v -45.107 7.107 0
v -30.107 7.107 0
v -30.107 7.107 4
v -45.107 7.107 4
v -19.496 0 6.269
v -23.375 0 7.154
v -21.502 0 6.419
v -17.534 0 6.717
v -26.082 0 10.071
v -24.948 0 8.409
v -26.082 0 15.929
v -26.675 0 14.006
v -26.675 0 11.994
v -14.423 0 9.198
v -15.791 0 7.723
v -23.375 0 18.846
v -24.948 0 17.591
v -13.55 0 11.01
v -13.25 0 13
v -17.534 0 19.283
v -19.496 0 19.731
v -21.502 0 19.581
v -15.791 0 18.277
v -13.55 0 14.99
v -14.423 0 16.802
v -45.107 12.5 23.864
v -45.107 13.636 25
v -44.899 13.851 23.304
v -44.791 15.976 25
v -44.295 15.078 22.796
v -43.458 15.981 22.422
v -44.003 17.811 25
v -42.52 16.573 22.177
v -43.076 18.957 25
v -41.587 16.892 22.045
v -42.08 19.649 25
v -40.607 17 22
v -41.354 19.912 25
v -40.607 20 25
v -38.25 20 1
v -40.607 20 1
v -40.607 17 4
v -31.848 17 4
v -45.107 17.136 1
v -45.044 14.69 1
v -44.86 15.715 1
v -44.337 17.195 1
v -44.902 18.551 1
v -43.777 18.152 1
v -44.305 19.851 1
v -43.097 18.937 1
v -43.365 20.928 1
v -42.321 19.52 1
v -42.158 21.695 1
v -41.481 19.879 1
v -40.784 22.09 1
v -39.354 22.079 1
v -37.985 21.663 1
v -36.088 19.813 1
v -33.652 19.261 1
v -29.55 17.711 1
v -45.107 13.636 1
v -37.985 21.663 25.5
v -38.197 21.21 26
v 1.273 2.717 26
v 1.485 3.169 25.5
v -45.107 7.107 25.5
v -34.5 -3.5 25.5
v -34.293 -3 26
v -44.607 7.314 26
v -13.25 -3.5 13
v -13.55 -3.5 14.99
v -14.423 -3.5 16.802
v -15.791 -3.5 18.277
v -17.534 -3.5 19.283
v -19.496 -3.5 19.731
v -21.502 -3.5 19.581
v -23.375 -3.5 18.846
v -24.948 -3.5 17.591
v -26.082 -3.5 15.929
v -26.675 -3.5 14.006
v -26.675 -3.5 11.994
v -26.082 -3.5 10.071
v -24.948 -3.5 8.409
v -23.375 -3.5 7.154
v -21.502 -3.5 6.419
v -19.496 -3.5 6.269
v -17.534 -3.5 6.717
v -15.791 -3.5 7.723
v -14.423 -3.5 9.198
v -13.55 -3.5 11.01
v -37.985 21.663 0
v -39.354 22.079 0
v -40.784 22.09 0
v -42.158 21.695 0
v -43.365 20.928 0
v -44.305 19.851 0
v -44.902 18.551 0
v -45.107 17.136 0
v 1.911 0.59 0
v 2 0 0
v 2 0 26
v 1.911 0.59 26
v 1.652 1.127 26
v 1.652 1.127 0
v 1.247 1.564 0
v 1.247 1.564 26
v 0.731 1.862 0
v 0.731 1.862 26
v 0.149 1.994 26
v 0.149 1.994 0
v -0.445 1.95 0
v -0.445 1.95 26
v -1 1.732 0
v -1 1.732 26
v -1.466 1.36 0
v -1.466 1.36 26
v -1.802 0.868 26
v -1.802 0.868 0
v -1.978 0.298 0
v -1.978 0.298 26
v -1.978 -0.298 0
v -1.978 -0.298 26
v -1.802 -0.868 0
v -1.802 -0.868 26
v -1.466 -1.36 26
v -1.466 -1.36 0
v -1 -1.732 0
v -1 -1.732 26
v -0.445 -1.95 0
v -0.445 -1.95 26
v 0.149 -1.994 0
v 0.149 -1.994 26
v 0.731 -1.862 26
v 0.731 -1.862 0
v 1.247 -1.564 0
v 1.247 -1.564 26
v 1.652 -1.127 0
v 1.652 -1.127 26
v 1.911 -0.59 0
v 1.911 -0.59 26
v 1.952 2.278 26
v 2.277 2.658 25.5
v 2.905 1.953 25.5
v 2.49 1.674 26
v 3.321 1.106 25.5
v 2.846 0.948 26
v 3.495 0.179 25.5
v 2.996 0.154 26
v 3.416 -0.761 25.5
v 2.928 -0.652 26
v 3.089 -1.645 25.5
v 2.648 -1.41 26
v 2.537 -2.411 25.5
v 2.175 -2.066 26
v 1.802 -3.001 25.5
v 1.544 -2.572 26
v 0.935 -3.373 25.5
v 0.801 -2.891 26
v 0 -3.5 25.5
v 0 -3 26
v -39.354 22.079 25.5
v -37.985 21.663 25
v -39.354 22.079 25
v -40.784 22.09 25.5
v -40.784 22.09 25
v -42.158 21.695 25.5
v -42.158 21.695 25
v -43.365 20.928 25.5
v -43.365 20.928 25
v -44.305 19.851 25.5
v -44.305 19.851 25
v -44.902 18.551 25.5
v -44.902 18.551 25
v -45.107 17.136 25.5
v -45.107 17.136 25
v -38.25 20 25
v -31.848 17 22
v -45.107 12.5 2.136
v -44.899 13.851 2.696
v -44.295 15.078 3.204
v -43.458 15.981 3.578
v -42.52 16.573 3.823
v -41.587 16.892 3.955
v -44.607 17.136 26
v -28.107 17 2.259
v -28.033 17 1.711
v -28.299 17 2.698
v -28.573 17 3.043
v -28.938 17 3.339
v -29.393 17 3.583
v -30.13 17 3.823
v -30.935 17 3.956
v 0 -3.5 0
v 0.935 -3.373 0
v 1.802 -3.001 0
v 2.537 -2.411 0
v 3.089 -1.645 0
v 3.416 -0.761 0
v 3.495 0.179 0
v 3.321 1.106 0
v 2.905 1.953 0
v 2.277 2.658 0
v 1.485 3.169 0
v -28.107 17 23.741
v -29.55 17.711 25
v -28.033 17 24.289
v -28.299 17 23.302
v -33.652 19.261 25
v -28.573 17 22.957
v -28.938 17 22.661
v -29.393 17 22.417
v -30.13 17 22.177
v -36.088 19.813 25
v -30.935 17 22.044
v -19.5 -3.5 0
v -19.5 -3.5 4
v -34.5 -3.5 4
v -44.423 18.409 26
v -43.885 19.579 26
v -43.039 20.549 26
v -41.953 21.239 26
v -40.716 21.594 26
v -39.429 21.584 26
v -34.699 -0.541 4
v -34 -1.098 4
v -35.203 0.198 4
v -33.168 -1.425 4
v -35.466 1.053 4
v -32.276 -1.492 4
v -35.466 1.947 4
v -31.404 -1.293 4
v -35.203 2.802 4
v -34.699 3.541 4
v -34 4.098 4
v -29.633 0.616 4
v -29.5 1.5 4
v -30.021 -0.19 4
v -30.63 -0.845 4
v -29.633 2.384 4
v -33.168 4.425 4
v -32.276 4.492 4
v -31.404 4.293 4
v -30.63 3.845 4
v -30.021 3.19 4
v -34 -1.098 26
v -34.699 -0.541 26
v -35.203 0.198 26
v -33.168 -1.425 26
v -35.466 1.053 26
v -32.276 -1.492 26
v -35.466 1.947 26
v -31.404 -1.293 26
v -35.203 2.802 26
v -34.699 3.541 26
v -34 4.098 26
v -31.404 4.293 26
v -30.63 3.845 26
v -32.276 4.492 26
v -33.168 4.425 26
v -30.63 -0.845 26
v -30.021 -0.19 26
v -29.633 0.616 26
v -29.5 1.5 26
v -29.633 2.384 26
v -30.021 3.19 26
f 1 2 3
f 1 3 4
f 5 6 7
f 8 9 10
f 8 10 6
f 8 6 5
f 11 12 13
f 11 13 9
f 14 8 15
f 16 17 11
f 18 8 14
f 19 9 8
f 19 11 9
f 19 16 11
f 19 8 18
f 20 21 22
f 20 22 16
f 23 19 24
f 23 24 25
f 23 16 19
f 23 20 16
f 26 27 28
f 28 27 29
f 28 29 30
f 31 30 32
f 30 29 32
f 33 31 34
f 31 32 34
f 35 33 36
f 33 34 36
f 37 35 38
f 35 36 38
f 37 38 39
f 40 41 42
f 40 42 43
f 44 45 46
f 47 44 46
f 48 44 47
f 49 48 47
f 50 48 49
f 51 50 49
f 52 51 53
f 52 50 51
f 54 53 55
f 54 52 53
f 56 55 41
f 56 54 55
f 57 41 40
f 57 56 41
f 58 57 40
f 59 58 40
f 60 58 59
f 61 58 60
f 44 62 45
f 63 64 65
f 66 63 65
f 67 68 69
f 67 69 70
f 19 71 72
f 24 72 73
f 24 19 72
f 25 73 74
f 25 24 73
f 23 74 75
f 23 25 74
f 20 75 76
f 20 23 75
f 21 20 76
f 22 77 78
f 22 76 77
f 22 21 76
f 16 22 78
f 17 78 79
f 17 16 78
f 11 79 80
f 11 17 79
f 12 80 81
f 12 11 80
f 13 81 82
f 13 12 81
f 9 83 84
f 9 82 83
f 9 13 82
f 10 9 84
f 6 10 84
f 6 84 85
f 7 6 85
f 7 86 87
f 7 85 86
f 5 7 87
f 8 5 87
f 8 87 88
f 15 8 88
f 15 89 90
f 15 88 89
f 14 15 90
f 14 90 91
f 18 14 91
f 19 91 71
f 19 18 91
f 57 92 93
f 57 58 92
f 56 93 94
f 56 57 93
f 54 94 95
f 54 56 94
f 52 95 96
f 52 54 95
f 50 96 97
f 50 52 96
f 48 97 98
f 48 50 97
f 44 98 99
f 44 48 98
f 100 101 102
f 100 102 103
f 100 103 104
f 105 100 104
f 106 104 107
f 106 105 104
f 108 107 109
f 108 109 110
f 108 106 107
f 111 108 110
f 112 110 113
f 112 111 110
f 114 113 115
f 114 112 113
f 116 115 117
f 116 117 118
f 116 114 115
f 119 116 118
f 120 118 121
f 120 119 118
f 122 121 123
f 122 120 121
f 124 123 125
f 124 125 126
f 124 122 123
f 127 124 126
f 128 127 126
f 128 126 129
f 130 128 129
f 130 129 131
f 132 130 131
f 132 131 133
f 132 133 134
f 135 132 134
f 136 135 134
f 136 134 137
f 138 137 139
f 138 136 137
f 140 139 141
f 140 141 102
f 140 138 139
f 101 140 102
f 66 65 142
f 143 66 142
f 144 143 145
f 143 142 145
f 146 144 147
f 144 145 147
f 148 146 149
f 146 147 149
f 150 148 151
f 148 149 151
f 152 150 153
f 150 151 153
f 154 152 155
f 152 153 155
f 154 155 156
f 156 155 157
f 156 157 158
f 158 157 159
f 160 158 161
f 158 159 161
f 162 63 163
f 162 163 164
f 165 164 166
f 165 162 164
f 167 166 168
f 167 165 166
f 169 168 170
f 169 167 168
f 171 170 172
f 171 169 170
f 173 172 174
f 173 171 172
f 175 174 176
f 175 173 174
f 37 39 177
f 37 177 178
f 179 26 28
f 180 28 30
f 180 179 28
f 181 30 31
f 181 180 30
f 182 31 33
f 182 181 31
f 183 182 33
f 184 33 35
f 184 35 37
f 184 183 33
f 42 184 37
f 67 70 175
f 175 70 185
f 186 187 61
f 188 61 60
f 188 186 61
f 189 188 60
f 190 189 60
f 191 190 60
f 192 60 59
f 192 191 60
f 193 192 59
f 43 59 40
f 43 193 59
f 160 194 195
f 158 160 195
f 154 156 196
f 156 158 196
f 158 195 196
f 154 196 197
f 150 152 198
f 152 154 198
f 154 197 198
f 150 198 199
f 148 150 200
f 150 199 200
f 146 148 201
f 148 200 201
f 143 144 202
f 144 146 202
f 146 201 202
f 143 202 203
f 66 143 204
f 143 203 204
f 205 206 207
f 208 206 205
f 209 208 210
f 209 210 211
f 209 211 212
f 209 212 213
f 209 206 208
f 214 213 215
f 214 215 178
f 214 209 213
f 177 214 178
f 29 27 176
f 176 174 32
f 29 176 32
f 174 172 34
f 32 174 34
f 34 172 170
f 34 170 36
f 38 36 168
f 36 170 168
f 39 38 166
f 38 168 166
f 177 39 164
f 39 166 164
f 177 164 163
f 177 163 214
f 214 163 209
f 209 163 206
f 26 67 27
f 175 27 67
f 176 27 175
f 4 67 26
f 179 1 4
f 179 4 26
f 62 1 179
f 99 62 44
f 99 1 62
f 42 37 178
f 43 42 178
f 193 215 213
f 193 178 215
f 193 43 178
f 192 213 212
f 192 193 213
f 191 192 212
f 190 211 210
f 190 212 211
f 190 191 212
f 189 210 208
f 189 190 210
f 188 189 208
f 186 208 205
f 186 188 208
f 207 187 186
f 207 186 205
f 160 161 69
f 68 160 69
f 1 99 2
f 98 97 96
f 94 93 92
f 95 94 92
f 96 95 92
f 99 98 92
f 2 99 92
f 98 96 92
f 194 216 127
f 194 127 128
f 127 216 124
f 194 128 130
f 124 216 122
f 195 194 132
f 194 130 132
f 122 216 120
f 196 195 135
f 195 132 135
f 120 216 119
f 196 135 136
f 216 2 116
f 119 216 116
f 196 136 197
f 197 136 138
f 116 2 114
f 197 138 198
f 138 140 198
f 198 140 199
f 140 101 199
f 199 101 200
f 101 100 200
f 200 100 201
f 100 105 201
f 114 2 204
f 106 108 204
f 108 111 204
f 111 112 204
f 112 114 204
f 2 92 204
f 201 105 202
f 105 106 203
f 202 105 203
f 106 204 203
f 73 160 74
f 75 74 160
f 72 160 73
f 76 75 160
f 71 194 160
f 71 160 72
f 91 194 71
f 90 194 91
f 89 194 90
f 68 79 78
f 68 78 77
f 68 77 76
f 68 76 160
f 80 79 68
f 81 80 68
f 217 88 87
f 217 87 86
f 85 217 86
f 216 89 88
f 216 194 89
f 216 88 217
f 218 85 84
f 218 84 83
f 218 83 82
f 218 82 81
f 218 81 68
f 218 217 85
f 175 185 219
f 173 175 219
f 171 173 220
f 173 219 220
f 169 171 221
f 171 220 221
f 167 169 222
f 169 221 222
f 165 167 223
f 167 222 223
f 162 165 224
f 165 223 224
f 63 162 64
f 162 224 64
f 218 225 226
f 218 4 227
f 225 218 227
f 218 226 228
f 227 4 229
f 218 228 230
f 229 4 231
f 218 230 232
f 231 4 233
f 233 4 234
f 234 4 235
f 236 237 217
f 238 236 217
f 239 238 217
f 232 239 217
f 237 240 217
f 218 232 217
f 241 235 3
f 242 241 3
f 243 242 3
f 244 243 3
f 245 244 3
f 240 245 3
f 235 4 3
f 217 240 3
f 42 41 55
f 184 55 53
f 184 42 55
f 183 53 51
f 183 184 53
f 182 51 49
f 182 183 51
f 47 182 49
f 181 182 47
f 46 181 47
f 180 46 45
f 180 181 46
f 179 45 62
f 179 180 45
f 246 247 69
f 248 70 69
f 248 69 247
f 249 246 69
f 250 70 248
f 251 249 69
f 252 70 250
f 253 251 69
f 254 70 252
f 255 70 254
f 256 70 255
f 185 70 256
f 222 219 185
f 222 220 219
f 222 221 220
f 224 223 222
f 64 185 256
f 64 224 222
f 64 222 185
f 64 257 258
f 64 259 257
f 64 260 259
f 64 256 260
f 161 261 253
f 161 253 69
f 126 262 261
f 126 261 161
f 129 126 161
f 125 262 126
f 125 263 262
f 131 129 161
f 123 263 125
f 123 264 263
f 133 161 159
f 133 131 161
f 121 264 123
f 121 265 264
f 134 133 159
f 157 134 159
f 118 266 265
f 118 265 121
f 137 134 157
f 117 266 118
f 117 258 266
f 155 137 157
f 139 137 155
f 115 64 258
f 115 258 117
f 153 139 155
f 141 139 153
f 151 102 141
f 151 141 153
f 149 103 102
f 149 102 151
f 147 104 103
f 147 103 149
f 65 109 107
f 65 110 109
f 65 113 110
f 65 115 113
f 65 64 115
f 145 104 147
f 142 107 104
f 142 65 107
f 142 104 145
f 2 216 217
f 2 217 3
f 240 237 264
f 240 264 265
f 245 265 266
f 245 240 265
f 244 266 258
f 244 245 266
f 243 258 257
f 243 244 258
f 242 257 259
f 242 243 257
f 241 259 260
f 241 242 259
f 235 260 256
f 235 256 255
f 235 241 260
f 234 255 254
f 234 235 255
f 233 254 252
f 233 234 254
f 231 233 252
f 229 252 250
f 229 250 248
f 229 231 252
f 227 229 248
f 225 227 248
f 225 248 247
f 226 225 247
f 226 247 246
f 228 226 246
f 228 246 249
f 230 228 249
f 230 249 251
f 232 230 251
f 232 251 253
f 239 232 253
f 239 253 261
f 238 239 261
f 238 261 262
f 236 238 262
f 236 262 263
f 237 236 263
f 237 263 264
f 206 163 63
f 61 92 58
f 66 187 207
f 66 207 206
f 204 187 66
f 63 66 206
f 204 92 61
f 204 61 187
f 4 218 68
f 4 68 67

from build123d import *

# Parameters (mm, degrees)
SKETCH_R          = 2
PAD_DEPTH         = 26
POCKET_DEPTH      = 12
POCKET_DEPTH_BACK = -12
POCKET001_DEPTH   = 4
CHAMFER_SIZE      = 3
SKETCH003_R       = 3
POCKET002_DEPTH   = 26
SKETCH004_R       = 6.75
POCKET003_DEPTH   = 5
FILLET_R          = 4.5
FILLET001_R       = 5
CHAMFER001_SIZE   = 0.5


with BuildPart() as part:
    # Sketch → Pad (new body)
    with BuildSketch(Plane.XY):
        with BuildLine():
            ThreePointArc((1e-06, -3.5), (3.416335, -0.760696), (1.485025, 3.169337))
            Line((-45.1066, 25), (1.485025, 3.169337))
            Line((-45.1066, 7.106602), (-45.1066, 25))
            Line((-34.499999, -3.5), (-45.1066, 7.106602))
            Line((1e-06, -3.5), (-34.499999, -3.5))
        make_face()
        Circle(SKETCH_R, mode=Mode.SUBTRACT)
    extrude(amount=PAD_DEPTH)

    # Sketch001 (on DatumPlane) → Pocket (cut, two sides)
    with BuildSketch(Plane.XY.offset(13)) as pocket_sk:
        Polygon((-60, 17), (-10, 17), (-60, 55), align=None)
    extrude(amount=-POCKET_DEPTH, mode=Mode.SUBTRACT)
    extrude(pocket_sk.sketch, amount=-POCKET_DEPTH_BACK, mode=Mode.SUBTRACT)

    # Sketch002 → Pocket001 (cut)
    with BuildSketch(Plane.XY):
        Polygon((-19.5, -3.5), (-30.106602, 7.106602), (-45.106602, 7.106602), (-34.5, -3.5), align=None)
    extrude(amount=POCKET001_DEPTH, mode=Mode.SUBTRACT)

    # Chamfer
    chamfer_edges = [part.edges().sort_by_distance(p)[0] for p in [
        (-36.569686, 17, 1),
        (-36.569686, 17, 25),
    ]]
    chamfer(chamfer_edges, length=CHAMFER_SIZE)

    # Sketch003 → Pocket002 (cut)
    with BuildSketch(Plane.XY):
        with Locations((-32.5, 1.5)):
            Circle(SKETCH003_R)
    extrude(amount=POCKET002_DEPTH, mode=Mode.SUBTRACT)

    # Sketch004 → Pocket003 (cut)
    with BuildSketch(Plane.XZ):
        with Locations((-20, 13)):
            Circle(SKETCH004_R)
    extrude(amount=POCKET003_DEPTH, mode=Mode.SUBTRACT)

    # Fillet
    fillet_edges = [part.edges().sort_by_distance(p)[0] for p in [
        (-45.1066, 17, 13),
        (-45.1066, 18.5, 2.5),
        (-45.1066, 18.5, 23.5),
        (-31.234114, 18.5, 23.5),
        (-31.234114, 18.5, 2.5),
    ]]
    fillet(fillet_edges, radius=FILLET_R)

    # Fillet001
    fillet001_edges = [part.edges().sort_by_distance(p)[0] for p in [
        (-45.1066, 25, 0.5),
        (-45.1066, 25, 25.5),
    ]]
    fillet(fillet001_edges, radius=FILLET001_R)

    # Chamfer001
    chamfer001_edges = [part.edges().sort_by_distance(p)[0] for p in [
        (-39.803299, 1.803301, 26),
        (-18.250068, 12.416282, 26),
    ]]
    chamfer(chamfer001_edges, length=CHAMFER001_SIZE)


solid = part.part
